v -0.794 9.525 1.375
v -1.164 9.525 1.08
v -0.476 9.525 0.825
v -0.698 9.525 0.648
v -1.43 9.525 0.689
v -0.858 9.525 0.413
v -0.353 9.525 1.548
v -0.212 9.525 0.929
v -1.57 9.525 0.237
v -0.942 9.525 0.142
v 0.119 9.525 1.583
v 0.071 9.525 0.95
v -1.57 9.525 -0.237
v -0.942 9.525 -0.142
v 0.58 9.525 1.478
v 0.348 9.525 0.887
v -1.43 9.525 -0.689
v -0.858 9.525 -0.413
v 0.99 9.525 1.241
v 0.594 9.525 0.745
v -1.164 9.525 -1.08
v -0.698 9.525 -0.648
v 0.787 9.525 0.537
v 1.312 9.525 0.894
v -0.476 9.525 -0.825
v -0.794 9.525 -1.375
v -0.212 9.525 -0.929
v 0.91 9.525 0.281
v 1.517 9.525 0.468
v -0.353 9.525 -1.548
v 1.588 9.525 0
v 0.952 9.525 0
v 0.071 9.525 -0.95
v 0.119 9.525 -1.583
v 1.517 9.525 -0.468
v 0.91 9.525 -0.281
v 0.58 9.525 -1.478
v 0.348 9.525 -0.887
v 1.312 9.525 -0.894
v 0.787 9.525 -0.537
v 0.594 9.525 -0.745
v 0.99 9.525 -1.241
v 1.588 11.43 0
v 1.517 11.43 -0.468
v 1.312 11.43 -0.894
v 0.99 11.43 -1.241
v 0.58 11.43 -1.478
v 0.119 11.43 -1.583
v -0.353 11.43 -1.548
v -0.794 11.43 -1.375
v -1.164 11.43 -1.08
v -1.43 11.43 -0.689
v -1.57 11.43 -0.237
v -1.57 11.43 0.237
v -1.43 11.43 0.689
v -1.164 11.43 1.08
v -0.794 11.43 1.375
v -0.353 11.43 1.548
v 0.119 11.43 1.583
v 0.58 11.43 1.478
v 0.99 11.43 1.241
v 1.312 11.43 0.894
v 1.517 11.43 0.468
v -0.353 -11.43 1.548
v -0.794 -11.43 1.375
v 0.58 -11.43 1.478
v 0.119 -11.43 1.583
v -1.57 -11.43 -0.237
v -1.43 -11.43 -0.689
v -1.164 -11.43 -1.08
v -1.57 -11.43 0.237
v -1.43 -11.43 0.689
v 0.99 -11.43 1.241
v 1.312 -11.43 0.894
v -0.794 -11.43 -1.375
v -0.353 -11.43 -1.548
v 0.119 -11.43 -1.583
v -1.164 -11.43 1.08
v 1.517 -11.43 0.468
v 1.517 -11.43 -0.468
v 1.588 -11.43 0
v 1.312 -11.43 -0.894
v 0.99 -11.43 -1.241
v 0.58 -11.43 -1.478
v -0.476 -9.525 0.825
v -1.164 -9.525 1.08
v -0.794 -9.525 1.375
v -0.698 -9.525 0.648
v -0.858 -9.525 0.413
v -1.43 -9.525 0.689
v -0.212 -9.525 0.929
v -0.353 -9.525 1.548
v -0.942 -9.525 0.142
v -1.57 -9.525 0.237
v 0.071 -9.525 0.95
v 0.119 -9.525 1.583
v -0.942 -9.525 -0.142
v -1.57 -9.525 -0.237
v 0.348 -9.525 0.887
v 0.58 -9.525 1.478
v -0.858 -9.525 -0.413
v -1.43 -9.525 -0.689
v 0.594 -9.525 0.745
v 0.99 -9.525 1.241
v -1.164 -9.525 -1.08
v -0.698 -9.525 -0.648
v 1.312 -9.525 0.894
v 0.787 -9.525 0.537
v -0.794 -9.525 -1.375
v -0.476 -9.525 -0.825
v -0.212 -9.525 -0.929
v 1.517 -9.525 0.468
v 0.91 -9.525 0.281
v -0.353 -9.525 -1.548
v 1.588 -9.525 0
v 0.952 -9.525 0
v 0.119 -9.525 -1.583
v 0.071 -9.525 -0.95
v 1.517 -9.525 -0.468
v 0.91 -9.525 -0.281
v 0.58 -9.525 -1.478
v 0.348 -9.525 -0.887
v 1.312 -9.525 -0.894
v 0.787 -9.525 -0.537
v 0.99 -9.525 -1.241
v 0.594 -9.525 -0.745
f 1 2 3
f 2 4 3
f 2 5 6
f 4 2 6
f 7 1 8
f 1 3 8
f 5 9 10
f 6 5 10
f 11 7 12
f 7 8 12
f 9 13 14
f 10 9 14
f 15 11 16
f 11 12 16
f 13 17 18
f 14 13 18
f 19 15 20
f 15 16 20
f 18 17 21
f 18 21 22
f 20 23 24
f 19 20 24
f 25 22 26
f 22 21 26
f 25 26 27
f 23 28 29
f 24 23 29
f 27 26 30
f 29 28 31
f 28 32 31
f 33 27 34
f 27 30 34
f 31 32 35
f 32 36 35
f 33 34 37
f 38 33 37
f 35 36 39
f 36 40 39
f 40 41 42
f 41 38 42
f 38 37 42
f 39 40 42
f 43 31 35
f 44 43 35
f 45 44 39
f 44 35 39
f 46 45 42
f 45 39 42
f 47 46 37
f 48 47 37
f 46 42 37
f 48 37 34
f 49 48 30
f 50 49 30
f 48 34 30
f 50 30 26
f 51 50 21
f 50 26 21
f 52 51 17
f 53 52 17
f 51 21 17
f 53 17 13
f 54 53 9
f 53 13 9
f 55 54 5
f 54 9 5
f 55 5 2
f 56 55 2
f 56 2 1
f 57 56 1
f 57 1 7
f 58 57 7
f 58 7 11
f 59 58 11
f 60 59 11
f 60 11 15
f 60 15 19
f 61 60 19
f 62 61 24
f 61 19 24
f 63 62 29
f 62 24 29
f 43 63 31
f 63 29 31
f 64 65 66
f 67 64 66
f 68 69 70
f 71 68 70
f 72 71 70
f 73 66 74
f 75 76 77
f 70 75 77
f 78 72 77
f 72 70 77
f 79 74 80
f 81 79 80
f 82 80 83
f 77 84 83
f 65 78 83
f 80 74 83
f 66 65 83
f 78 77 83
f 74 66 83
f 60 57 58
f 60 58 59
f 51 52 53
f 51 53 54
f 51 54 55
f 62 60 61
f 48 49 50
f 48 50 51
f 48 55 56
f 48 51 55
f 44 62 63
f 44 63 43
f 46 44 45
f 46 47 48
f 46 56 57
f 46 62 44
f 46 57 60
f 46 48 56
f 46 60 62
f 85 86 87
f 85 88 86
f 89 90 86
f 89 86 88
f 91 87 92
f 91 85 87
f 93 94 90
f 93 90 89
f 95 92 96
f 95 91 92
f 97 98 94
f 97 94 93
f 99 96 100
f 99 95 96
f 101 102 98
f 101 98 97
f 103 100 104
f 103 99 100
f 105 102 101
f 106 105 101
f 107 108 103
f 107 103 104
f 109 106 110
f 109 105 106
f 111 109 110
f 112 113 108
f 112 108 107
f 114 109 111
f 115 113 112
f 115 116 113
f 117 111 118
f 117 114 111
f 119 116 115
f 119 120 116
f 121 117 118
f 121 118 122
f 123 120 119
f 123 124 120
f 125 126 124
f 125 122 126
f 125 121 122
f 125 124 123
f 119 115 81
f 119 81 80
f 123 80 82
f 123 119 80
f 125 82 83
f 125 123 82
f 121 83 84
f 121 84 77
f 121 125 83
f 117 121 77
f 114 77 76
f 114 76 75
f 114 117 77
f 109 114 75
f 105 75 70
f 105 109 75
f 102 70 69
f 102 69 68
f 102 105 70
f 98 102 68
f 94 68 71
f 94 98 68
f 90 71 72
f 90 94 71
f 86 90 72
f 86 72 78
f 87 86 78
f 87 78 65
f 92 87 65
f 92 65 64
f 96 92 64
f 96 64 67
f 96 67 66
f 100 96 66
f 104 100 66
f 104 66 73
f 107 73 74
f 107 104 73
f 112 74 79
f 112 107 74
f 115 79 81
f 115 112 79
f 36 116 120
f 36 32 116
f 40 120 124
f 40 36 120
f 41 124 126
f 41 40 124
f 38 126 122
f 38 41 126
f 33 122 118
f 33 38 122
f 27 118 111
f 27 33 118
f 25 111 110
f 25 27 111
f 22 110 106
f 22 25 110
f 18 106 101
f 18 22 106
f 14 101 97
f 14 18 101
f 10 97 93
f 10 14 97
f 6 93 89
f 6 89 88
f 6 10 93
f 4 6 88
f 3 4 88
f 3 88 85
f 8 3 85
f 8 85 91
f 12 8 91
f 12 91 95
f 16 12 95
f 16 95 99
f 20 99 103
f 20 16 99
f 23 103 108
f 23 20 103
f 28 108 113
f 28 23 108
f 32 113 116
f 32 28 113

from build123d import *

# Parameters (mm, degrees)
SKETCH1_R           = 0.9525
BOSS_EXTRUDE1_DEPTH = 9.525
SKETCH2_R           = 1.5875
BOSS_EXTRUDE2_DEPTH = 1.905


with BuildPart() as part:
    # Sketch1 → Boss-Extrude1 (new body)
    with BuildSketch(Plane(origin=(0, 0, 0), x_dir=(1, 0, 0), z_dir=(0, 1, 0))):
        Circle(SKETCH1_R)
    boss_extrude1 = extrude(amount=BOSS_EXTRUDE1_DEPTH)

    # Sketch2 → Boss-Extrude2 (add)
    with BuildSketch(Plane(origin=(0, 9.525, 0), x_dir=(1, 0, 0), z_dir=(0, 1, 0))):
        Circle(SKETCH2_R)
    boss_extrude2 = extrude(amount=BOSS_EXTRUDE2_DEPTH)

    # Mirror1: Boss-Extrude1, Boss-Extrude2 across plane
    add(boss_extrude1.mirror(Plane.ZX))
    add(boss_extrude2.mirror(Plane.ZX))


solid = part.part
